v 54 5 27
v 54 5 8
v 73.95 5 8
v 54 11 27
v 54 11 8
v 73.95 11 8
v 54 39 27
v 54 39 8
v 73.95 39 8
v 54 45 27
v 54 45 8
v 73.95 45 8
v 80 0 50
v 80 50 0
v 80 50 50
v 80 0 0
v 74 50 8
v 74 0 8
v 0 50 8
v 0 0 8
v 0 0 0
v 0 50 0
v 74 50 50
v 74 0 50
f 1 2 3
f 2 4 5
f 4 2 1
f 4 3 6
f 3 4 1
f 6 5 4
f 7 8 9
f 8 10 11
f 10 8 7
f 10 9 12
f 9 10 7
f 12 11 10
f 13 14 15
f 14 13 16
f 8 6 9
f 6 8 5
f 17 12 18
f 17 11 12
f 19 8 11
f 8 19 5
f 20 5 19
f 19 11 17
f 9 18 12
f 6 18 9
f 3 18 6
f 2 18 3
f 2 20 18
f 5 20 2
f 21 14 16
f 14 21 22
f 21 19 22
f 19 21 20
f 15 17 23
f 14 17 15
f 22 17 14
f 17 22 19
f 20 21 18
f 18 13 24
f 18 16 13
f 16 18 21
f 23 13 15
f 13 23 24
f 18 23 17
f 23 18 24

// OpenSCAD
$fn = 32;

// ----------------------------------------------------------------------
// Rib bracket: 2-gusset L bracket
// ----------------------------------------------------------------------

// --- parameters (mm) ---
base_l = 80;              // foot length, X
base_w = 50;              // foot width, Y
base_t = 8;               // foot thickness
plate_t = 6;              // upright plate thickness
plate_h = 50;             // overall height
gus_l = 20;               // gusset leg along the foot
gus_h = 20;               // gusset height
gus_t = 6;                // gusset thickness
gus_edge = 5;             // gusset margin from the foot edge
n_gus = 2;                // gusset count

gus_pitch = (base_w - 2 * gus_edge - gus_t) / (n_gus - 1);  // gusset pitch

union() {
  cube([base_l, base_w, base_t]);
  translate([base_l - plate_t, 0, base_t - 1])
    cube([plate_t, base_w, plate_h - base_t + 1]);
  for (i = [0 : n_gus - 1])
    translate([base_l - plate_t - gus_l, gus_edge + i * gus_pitch, base_t - 1])
      rotate([-90, 0, 0])
        linear_extrude(height = gus_t)
          polygon(points = [[0, 0], [gus_l + 1, 0], [0, -gus_h]]);
}
